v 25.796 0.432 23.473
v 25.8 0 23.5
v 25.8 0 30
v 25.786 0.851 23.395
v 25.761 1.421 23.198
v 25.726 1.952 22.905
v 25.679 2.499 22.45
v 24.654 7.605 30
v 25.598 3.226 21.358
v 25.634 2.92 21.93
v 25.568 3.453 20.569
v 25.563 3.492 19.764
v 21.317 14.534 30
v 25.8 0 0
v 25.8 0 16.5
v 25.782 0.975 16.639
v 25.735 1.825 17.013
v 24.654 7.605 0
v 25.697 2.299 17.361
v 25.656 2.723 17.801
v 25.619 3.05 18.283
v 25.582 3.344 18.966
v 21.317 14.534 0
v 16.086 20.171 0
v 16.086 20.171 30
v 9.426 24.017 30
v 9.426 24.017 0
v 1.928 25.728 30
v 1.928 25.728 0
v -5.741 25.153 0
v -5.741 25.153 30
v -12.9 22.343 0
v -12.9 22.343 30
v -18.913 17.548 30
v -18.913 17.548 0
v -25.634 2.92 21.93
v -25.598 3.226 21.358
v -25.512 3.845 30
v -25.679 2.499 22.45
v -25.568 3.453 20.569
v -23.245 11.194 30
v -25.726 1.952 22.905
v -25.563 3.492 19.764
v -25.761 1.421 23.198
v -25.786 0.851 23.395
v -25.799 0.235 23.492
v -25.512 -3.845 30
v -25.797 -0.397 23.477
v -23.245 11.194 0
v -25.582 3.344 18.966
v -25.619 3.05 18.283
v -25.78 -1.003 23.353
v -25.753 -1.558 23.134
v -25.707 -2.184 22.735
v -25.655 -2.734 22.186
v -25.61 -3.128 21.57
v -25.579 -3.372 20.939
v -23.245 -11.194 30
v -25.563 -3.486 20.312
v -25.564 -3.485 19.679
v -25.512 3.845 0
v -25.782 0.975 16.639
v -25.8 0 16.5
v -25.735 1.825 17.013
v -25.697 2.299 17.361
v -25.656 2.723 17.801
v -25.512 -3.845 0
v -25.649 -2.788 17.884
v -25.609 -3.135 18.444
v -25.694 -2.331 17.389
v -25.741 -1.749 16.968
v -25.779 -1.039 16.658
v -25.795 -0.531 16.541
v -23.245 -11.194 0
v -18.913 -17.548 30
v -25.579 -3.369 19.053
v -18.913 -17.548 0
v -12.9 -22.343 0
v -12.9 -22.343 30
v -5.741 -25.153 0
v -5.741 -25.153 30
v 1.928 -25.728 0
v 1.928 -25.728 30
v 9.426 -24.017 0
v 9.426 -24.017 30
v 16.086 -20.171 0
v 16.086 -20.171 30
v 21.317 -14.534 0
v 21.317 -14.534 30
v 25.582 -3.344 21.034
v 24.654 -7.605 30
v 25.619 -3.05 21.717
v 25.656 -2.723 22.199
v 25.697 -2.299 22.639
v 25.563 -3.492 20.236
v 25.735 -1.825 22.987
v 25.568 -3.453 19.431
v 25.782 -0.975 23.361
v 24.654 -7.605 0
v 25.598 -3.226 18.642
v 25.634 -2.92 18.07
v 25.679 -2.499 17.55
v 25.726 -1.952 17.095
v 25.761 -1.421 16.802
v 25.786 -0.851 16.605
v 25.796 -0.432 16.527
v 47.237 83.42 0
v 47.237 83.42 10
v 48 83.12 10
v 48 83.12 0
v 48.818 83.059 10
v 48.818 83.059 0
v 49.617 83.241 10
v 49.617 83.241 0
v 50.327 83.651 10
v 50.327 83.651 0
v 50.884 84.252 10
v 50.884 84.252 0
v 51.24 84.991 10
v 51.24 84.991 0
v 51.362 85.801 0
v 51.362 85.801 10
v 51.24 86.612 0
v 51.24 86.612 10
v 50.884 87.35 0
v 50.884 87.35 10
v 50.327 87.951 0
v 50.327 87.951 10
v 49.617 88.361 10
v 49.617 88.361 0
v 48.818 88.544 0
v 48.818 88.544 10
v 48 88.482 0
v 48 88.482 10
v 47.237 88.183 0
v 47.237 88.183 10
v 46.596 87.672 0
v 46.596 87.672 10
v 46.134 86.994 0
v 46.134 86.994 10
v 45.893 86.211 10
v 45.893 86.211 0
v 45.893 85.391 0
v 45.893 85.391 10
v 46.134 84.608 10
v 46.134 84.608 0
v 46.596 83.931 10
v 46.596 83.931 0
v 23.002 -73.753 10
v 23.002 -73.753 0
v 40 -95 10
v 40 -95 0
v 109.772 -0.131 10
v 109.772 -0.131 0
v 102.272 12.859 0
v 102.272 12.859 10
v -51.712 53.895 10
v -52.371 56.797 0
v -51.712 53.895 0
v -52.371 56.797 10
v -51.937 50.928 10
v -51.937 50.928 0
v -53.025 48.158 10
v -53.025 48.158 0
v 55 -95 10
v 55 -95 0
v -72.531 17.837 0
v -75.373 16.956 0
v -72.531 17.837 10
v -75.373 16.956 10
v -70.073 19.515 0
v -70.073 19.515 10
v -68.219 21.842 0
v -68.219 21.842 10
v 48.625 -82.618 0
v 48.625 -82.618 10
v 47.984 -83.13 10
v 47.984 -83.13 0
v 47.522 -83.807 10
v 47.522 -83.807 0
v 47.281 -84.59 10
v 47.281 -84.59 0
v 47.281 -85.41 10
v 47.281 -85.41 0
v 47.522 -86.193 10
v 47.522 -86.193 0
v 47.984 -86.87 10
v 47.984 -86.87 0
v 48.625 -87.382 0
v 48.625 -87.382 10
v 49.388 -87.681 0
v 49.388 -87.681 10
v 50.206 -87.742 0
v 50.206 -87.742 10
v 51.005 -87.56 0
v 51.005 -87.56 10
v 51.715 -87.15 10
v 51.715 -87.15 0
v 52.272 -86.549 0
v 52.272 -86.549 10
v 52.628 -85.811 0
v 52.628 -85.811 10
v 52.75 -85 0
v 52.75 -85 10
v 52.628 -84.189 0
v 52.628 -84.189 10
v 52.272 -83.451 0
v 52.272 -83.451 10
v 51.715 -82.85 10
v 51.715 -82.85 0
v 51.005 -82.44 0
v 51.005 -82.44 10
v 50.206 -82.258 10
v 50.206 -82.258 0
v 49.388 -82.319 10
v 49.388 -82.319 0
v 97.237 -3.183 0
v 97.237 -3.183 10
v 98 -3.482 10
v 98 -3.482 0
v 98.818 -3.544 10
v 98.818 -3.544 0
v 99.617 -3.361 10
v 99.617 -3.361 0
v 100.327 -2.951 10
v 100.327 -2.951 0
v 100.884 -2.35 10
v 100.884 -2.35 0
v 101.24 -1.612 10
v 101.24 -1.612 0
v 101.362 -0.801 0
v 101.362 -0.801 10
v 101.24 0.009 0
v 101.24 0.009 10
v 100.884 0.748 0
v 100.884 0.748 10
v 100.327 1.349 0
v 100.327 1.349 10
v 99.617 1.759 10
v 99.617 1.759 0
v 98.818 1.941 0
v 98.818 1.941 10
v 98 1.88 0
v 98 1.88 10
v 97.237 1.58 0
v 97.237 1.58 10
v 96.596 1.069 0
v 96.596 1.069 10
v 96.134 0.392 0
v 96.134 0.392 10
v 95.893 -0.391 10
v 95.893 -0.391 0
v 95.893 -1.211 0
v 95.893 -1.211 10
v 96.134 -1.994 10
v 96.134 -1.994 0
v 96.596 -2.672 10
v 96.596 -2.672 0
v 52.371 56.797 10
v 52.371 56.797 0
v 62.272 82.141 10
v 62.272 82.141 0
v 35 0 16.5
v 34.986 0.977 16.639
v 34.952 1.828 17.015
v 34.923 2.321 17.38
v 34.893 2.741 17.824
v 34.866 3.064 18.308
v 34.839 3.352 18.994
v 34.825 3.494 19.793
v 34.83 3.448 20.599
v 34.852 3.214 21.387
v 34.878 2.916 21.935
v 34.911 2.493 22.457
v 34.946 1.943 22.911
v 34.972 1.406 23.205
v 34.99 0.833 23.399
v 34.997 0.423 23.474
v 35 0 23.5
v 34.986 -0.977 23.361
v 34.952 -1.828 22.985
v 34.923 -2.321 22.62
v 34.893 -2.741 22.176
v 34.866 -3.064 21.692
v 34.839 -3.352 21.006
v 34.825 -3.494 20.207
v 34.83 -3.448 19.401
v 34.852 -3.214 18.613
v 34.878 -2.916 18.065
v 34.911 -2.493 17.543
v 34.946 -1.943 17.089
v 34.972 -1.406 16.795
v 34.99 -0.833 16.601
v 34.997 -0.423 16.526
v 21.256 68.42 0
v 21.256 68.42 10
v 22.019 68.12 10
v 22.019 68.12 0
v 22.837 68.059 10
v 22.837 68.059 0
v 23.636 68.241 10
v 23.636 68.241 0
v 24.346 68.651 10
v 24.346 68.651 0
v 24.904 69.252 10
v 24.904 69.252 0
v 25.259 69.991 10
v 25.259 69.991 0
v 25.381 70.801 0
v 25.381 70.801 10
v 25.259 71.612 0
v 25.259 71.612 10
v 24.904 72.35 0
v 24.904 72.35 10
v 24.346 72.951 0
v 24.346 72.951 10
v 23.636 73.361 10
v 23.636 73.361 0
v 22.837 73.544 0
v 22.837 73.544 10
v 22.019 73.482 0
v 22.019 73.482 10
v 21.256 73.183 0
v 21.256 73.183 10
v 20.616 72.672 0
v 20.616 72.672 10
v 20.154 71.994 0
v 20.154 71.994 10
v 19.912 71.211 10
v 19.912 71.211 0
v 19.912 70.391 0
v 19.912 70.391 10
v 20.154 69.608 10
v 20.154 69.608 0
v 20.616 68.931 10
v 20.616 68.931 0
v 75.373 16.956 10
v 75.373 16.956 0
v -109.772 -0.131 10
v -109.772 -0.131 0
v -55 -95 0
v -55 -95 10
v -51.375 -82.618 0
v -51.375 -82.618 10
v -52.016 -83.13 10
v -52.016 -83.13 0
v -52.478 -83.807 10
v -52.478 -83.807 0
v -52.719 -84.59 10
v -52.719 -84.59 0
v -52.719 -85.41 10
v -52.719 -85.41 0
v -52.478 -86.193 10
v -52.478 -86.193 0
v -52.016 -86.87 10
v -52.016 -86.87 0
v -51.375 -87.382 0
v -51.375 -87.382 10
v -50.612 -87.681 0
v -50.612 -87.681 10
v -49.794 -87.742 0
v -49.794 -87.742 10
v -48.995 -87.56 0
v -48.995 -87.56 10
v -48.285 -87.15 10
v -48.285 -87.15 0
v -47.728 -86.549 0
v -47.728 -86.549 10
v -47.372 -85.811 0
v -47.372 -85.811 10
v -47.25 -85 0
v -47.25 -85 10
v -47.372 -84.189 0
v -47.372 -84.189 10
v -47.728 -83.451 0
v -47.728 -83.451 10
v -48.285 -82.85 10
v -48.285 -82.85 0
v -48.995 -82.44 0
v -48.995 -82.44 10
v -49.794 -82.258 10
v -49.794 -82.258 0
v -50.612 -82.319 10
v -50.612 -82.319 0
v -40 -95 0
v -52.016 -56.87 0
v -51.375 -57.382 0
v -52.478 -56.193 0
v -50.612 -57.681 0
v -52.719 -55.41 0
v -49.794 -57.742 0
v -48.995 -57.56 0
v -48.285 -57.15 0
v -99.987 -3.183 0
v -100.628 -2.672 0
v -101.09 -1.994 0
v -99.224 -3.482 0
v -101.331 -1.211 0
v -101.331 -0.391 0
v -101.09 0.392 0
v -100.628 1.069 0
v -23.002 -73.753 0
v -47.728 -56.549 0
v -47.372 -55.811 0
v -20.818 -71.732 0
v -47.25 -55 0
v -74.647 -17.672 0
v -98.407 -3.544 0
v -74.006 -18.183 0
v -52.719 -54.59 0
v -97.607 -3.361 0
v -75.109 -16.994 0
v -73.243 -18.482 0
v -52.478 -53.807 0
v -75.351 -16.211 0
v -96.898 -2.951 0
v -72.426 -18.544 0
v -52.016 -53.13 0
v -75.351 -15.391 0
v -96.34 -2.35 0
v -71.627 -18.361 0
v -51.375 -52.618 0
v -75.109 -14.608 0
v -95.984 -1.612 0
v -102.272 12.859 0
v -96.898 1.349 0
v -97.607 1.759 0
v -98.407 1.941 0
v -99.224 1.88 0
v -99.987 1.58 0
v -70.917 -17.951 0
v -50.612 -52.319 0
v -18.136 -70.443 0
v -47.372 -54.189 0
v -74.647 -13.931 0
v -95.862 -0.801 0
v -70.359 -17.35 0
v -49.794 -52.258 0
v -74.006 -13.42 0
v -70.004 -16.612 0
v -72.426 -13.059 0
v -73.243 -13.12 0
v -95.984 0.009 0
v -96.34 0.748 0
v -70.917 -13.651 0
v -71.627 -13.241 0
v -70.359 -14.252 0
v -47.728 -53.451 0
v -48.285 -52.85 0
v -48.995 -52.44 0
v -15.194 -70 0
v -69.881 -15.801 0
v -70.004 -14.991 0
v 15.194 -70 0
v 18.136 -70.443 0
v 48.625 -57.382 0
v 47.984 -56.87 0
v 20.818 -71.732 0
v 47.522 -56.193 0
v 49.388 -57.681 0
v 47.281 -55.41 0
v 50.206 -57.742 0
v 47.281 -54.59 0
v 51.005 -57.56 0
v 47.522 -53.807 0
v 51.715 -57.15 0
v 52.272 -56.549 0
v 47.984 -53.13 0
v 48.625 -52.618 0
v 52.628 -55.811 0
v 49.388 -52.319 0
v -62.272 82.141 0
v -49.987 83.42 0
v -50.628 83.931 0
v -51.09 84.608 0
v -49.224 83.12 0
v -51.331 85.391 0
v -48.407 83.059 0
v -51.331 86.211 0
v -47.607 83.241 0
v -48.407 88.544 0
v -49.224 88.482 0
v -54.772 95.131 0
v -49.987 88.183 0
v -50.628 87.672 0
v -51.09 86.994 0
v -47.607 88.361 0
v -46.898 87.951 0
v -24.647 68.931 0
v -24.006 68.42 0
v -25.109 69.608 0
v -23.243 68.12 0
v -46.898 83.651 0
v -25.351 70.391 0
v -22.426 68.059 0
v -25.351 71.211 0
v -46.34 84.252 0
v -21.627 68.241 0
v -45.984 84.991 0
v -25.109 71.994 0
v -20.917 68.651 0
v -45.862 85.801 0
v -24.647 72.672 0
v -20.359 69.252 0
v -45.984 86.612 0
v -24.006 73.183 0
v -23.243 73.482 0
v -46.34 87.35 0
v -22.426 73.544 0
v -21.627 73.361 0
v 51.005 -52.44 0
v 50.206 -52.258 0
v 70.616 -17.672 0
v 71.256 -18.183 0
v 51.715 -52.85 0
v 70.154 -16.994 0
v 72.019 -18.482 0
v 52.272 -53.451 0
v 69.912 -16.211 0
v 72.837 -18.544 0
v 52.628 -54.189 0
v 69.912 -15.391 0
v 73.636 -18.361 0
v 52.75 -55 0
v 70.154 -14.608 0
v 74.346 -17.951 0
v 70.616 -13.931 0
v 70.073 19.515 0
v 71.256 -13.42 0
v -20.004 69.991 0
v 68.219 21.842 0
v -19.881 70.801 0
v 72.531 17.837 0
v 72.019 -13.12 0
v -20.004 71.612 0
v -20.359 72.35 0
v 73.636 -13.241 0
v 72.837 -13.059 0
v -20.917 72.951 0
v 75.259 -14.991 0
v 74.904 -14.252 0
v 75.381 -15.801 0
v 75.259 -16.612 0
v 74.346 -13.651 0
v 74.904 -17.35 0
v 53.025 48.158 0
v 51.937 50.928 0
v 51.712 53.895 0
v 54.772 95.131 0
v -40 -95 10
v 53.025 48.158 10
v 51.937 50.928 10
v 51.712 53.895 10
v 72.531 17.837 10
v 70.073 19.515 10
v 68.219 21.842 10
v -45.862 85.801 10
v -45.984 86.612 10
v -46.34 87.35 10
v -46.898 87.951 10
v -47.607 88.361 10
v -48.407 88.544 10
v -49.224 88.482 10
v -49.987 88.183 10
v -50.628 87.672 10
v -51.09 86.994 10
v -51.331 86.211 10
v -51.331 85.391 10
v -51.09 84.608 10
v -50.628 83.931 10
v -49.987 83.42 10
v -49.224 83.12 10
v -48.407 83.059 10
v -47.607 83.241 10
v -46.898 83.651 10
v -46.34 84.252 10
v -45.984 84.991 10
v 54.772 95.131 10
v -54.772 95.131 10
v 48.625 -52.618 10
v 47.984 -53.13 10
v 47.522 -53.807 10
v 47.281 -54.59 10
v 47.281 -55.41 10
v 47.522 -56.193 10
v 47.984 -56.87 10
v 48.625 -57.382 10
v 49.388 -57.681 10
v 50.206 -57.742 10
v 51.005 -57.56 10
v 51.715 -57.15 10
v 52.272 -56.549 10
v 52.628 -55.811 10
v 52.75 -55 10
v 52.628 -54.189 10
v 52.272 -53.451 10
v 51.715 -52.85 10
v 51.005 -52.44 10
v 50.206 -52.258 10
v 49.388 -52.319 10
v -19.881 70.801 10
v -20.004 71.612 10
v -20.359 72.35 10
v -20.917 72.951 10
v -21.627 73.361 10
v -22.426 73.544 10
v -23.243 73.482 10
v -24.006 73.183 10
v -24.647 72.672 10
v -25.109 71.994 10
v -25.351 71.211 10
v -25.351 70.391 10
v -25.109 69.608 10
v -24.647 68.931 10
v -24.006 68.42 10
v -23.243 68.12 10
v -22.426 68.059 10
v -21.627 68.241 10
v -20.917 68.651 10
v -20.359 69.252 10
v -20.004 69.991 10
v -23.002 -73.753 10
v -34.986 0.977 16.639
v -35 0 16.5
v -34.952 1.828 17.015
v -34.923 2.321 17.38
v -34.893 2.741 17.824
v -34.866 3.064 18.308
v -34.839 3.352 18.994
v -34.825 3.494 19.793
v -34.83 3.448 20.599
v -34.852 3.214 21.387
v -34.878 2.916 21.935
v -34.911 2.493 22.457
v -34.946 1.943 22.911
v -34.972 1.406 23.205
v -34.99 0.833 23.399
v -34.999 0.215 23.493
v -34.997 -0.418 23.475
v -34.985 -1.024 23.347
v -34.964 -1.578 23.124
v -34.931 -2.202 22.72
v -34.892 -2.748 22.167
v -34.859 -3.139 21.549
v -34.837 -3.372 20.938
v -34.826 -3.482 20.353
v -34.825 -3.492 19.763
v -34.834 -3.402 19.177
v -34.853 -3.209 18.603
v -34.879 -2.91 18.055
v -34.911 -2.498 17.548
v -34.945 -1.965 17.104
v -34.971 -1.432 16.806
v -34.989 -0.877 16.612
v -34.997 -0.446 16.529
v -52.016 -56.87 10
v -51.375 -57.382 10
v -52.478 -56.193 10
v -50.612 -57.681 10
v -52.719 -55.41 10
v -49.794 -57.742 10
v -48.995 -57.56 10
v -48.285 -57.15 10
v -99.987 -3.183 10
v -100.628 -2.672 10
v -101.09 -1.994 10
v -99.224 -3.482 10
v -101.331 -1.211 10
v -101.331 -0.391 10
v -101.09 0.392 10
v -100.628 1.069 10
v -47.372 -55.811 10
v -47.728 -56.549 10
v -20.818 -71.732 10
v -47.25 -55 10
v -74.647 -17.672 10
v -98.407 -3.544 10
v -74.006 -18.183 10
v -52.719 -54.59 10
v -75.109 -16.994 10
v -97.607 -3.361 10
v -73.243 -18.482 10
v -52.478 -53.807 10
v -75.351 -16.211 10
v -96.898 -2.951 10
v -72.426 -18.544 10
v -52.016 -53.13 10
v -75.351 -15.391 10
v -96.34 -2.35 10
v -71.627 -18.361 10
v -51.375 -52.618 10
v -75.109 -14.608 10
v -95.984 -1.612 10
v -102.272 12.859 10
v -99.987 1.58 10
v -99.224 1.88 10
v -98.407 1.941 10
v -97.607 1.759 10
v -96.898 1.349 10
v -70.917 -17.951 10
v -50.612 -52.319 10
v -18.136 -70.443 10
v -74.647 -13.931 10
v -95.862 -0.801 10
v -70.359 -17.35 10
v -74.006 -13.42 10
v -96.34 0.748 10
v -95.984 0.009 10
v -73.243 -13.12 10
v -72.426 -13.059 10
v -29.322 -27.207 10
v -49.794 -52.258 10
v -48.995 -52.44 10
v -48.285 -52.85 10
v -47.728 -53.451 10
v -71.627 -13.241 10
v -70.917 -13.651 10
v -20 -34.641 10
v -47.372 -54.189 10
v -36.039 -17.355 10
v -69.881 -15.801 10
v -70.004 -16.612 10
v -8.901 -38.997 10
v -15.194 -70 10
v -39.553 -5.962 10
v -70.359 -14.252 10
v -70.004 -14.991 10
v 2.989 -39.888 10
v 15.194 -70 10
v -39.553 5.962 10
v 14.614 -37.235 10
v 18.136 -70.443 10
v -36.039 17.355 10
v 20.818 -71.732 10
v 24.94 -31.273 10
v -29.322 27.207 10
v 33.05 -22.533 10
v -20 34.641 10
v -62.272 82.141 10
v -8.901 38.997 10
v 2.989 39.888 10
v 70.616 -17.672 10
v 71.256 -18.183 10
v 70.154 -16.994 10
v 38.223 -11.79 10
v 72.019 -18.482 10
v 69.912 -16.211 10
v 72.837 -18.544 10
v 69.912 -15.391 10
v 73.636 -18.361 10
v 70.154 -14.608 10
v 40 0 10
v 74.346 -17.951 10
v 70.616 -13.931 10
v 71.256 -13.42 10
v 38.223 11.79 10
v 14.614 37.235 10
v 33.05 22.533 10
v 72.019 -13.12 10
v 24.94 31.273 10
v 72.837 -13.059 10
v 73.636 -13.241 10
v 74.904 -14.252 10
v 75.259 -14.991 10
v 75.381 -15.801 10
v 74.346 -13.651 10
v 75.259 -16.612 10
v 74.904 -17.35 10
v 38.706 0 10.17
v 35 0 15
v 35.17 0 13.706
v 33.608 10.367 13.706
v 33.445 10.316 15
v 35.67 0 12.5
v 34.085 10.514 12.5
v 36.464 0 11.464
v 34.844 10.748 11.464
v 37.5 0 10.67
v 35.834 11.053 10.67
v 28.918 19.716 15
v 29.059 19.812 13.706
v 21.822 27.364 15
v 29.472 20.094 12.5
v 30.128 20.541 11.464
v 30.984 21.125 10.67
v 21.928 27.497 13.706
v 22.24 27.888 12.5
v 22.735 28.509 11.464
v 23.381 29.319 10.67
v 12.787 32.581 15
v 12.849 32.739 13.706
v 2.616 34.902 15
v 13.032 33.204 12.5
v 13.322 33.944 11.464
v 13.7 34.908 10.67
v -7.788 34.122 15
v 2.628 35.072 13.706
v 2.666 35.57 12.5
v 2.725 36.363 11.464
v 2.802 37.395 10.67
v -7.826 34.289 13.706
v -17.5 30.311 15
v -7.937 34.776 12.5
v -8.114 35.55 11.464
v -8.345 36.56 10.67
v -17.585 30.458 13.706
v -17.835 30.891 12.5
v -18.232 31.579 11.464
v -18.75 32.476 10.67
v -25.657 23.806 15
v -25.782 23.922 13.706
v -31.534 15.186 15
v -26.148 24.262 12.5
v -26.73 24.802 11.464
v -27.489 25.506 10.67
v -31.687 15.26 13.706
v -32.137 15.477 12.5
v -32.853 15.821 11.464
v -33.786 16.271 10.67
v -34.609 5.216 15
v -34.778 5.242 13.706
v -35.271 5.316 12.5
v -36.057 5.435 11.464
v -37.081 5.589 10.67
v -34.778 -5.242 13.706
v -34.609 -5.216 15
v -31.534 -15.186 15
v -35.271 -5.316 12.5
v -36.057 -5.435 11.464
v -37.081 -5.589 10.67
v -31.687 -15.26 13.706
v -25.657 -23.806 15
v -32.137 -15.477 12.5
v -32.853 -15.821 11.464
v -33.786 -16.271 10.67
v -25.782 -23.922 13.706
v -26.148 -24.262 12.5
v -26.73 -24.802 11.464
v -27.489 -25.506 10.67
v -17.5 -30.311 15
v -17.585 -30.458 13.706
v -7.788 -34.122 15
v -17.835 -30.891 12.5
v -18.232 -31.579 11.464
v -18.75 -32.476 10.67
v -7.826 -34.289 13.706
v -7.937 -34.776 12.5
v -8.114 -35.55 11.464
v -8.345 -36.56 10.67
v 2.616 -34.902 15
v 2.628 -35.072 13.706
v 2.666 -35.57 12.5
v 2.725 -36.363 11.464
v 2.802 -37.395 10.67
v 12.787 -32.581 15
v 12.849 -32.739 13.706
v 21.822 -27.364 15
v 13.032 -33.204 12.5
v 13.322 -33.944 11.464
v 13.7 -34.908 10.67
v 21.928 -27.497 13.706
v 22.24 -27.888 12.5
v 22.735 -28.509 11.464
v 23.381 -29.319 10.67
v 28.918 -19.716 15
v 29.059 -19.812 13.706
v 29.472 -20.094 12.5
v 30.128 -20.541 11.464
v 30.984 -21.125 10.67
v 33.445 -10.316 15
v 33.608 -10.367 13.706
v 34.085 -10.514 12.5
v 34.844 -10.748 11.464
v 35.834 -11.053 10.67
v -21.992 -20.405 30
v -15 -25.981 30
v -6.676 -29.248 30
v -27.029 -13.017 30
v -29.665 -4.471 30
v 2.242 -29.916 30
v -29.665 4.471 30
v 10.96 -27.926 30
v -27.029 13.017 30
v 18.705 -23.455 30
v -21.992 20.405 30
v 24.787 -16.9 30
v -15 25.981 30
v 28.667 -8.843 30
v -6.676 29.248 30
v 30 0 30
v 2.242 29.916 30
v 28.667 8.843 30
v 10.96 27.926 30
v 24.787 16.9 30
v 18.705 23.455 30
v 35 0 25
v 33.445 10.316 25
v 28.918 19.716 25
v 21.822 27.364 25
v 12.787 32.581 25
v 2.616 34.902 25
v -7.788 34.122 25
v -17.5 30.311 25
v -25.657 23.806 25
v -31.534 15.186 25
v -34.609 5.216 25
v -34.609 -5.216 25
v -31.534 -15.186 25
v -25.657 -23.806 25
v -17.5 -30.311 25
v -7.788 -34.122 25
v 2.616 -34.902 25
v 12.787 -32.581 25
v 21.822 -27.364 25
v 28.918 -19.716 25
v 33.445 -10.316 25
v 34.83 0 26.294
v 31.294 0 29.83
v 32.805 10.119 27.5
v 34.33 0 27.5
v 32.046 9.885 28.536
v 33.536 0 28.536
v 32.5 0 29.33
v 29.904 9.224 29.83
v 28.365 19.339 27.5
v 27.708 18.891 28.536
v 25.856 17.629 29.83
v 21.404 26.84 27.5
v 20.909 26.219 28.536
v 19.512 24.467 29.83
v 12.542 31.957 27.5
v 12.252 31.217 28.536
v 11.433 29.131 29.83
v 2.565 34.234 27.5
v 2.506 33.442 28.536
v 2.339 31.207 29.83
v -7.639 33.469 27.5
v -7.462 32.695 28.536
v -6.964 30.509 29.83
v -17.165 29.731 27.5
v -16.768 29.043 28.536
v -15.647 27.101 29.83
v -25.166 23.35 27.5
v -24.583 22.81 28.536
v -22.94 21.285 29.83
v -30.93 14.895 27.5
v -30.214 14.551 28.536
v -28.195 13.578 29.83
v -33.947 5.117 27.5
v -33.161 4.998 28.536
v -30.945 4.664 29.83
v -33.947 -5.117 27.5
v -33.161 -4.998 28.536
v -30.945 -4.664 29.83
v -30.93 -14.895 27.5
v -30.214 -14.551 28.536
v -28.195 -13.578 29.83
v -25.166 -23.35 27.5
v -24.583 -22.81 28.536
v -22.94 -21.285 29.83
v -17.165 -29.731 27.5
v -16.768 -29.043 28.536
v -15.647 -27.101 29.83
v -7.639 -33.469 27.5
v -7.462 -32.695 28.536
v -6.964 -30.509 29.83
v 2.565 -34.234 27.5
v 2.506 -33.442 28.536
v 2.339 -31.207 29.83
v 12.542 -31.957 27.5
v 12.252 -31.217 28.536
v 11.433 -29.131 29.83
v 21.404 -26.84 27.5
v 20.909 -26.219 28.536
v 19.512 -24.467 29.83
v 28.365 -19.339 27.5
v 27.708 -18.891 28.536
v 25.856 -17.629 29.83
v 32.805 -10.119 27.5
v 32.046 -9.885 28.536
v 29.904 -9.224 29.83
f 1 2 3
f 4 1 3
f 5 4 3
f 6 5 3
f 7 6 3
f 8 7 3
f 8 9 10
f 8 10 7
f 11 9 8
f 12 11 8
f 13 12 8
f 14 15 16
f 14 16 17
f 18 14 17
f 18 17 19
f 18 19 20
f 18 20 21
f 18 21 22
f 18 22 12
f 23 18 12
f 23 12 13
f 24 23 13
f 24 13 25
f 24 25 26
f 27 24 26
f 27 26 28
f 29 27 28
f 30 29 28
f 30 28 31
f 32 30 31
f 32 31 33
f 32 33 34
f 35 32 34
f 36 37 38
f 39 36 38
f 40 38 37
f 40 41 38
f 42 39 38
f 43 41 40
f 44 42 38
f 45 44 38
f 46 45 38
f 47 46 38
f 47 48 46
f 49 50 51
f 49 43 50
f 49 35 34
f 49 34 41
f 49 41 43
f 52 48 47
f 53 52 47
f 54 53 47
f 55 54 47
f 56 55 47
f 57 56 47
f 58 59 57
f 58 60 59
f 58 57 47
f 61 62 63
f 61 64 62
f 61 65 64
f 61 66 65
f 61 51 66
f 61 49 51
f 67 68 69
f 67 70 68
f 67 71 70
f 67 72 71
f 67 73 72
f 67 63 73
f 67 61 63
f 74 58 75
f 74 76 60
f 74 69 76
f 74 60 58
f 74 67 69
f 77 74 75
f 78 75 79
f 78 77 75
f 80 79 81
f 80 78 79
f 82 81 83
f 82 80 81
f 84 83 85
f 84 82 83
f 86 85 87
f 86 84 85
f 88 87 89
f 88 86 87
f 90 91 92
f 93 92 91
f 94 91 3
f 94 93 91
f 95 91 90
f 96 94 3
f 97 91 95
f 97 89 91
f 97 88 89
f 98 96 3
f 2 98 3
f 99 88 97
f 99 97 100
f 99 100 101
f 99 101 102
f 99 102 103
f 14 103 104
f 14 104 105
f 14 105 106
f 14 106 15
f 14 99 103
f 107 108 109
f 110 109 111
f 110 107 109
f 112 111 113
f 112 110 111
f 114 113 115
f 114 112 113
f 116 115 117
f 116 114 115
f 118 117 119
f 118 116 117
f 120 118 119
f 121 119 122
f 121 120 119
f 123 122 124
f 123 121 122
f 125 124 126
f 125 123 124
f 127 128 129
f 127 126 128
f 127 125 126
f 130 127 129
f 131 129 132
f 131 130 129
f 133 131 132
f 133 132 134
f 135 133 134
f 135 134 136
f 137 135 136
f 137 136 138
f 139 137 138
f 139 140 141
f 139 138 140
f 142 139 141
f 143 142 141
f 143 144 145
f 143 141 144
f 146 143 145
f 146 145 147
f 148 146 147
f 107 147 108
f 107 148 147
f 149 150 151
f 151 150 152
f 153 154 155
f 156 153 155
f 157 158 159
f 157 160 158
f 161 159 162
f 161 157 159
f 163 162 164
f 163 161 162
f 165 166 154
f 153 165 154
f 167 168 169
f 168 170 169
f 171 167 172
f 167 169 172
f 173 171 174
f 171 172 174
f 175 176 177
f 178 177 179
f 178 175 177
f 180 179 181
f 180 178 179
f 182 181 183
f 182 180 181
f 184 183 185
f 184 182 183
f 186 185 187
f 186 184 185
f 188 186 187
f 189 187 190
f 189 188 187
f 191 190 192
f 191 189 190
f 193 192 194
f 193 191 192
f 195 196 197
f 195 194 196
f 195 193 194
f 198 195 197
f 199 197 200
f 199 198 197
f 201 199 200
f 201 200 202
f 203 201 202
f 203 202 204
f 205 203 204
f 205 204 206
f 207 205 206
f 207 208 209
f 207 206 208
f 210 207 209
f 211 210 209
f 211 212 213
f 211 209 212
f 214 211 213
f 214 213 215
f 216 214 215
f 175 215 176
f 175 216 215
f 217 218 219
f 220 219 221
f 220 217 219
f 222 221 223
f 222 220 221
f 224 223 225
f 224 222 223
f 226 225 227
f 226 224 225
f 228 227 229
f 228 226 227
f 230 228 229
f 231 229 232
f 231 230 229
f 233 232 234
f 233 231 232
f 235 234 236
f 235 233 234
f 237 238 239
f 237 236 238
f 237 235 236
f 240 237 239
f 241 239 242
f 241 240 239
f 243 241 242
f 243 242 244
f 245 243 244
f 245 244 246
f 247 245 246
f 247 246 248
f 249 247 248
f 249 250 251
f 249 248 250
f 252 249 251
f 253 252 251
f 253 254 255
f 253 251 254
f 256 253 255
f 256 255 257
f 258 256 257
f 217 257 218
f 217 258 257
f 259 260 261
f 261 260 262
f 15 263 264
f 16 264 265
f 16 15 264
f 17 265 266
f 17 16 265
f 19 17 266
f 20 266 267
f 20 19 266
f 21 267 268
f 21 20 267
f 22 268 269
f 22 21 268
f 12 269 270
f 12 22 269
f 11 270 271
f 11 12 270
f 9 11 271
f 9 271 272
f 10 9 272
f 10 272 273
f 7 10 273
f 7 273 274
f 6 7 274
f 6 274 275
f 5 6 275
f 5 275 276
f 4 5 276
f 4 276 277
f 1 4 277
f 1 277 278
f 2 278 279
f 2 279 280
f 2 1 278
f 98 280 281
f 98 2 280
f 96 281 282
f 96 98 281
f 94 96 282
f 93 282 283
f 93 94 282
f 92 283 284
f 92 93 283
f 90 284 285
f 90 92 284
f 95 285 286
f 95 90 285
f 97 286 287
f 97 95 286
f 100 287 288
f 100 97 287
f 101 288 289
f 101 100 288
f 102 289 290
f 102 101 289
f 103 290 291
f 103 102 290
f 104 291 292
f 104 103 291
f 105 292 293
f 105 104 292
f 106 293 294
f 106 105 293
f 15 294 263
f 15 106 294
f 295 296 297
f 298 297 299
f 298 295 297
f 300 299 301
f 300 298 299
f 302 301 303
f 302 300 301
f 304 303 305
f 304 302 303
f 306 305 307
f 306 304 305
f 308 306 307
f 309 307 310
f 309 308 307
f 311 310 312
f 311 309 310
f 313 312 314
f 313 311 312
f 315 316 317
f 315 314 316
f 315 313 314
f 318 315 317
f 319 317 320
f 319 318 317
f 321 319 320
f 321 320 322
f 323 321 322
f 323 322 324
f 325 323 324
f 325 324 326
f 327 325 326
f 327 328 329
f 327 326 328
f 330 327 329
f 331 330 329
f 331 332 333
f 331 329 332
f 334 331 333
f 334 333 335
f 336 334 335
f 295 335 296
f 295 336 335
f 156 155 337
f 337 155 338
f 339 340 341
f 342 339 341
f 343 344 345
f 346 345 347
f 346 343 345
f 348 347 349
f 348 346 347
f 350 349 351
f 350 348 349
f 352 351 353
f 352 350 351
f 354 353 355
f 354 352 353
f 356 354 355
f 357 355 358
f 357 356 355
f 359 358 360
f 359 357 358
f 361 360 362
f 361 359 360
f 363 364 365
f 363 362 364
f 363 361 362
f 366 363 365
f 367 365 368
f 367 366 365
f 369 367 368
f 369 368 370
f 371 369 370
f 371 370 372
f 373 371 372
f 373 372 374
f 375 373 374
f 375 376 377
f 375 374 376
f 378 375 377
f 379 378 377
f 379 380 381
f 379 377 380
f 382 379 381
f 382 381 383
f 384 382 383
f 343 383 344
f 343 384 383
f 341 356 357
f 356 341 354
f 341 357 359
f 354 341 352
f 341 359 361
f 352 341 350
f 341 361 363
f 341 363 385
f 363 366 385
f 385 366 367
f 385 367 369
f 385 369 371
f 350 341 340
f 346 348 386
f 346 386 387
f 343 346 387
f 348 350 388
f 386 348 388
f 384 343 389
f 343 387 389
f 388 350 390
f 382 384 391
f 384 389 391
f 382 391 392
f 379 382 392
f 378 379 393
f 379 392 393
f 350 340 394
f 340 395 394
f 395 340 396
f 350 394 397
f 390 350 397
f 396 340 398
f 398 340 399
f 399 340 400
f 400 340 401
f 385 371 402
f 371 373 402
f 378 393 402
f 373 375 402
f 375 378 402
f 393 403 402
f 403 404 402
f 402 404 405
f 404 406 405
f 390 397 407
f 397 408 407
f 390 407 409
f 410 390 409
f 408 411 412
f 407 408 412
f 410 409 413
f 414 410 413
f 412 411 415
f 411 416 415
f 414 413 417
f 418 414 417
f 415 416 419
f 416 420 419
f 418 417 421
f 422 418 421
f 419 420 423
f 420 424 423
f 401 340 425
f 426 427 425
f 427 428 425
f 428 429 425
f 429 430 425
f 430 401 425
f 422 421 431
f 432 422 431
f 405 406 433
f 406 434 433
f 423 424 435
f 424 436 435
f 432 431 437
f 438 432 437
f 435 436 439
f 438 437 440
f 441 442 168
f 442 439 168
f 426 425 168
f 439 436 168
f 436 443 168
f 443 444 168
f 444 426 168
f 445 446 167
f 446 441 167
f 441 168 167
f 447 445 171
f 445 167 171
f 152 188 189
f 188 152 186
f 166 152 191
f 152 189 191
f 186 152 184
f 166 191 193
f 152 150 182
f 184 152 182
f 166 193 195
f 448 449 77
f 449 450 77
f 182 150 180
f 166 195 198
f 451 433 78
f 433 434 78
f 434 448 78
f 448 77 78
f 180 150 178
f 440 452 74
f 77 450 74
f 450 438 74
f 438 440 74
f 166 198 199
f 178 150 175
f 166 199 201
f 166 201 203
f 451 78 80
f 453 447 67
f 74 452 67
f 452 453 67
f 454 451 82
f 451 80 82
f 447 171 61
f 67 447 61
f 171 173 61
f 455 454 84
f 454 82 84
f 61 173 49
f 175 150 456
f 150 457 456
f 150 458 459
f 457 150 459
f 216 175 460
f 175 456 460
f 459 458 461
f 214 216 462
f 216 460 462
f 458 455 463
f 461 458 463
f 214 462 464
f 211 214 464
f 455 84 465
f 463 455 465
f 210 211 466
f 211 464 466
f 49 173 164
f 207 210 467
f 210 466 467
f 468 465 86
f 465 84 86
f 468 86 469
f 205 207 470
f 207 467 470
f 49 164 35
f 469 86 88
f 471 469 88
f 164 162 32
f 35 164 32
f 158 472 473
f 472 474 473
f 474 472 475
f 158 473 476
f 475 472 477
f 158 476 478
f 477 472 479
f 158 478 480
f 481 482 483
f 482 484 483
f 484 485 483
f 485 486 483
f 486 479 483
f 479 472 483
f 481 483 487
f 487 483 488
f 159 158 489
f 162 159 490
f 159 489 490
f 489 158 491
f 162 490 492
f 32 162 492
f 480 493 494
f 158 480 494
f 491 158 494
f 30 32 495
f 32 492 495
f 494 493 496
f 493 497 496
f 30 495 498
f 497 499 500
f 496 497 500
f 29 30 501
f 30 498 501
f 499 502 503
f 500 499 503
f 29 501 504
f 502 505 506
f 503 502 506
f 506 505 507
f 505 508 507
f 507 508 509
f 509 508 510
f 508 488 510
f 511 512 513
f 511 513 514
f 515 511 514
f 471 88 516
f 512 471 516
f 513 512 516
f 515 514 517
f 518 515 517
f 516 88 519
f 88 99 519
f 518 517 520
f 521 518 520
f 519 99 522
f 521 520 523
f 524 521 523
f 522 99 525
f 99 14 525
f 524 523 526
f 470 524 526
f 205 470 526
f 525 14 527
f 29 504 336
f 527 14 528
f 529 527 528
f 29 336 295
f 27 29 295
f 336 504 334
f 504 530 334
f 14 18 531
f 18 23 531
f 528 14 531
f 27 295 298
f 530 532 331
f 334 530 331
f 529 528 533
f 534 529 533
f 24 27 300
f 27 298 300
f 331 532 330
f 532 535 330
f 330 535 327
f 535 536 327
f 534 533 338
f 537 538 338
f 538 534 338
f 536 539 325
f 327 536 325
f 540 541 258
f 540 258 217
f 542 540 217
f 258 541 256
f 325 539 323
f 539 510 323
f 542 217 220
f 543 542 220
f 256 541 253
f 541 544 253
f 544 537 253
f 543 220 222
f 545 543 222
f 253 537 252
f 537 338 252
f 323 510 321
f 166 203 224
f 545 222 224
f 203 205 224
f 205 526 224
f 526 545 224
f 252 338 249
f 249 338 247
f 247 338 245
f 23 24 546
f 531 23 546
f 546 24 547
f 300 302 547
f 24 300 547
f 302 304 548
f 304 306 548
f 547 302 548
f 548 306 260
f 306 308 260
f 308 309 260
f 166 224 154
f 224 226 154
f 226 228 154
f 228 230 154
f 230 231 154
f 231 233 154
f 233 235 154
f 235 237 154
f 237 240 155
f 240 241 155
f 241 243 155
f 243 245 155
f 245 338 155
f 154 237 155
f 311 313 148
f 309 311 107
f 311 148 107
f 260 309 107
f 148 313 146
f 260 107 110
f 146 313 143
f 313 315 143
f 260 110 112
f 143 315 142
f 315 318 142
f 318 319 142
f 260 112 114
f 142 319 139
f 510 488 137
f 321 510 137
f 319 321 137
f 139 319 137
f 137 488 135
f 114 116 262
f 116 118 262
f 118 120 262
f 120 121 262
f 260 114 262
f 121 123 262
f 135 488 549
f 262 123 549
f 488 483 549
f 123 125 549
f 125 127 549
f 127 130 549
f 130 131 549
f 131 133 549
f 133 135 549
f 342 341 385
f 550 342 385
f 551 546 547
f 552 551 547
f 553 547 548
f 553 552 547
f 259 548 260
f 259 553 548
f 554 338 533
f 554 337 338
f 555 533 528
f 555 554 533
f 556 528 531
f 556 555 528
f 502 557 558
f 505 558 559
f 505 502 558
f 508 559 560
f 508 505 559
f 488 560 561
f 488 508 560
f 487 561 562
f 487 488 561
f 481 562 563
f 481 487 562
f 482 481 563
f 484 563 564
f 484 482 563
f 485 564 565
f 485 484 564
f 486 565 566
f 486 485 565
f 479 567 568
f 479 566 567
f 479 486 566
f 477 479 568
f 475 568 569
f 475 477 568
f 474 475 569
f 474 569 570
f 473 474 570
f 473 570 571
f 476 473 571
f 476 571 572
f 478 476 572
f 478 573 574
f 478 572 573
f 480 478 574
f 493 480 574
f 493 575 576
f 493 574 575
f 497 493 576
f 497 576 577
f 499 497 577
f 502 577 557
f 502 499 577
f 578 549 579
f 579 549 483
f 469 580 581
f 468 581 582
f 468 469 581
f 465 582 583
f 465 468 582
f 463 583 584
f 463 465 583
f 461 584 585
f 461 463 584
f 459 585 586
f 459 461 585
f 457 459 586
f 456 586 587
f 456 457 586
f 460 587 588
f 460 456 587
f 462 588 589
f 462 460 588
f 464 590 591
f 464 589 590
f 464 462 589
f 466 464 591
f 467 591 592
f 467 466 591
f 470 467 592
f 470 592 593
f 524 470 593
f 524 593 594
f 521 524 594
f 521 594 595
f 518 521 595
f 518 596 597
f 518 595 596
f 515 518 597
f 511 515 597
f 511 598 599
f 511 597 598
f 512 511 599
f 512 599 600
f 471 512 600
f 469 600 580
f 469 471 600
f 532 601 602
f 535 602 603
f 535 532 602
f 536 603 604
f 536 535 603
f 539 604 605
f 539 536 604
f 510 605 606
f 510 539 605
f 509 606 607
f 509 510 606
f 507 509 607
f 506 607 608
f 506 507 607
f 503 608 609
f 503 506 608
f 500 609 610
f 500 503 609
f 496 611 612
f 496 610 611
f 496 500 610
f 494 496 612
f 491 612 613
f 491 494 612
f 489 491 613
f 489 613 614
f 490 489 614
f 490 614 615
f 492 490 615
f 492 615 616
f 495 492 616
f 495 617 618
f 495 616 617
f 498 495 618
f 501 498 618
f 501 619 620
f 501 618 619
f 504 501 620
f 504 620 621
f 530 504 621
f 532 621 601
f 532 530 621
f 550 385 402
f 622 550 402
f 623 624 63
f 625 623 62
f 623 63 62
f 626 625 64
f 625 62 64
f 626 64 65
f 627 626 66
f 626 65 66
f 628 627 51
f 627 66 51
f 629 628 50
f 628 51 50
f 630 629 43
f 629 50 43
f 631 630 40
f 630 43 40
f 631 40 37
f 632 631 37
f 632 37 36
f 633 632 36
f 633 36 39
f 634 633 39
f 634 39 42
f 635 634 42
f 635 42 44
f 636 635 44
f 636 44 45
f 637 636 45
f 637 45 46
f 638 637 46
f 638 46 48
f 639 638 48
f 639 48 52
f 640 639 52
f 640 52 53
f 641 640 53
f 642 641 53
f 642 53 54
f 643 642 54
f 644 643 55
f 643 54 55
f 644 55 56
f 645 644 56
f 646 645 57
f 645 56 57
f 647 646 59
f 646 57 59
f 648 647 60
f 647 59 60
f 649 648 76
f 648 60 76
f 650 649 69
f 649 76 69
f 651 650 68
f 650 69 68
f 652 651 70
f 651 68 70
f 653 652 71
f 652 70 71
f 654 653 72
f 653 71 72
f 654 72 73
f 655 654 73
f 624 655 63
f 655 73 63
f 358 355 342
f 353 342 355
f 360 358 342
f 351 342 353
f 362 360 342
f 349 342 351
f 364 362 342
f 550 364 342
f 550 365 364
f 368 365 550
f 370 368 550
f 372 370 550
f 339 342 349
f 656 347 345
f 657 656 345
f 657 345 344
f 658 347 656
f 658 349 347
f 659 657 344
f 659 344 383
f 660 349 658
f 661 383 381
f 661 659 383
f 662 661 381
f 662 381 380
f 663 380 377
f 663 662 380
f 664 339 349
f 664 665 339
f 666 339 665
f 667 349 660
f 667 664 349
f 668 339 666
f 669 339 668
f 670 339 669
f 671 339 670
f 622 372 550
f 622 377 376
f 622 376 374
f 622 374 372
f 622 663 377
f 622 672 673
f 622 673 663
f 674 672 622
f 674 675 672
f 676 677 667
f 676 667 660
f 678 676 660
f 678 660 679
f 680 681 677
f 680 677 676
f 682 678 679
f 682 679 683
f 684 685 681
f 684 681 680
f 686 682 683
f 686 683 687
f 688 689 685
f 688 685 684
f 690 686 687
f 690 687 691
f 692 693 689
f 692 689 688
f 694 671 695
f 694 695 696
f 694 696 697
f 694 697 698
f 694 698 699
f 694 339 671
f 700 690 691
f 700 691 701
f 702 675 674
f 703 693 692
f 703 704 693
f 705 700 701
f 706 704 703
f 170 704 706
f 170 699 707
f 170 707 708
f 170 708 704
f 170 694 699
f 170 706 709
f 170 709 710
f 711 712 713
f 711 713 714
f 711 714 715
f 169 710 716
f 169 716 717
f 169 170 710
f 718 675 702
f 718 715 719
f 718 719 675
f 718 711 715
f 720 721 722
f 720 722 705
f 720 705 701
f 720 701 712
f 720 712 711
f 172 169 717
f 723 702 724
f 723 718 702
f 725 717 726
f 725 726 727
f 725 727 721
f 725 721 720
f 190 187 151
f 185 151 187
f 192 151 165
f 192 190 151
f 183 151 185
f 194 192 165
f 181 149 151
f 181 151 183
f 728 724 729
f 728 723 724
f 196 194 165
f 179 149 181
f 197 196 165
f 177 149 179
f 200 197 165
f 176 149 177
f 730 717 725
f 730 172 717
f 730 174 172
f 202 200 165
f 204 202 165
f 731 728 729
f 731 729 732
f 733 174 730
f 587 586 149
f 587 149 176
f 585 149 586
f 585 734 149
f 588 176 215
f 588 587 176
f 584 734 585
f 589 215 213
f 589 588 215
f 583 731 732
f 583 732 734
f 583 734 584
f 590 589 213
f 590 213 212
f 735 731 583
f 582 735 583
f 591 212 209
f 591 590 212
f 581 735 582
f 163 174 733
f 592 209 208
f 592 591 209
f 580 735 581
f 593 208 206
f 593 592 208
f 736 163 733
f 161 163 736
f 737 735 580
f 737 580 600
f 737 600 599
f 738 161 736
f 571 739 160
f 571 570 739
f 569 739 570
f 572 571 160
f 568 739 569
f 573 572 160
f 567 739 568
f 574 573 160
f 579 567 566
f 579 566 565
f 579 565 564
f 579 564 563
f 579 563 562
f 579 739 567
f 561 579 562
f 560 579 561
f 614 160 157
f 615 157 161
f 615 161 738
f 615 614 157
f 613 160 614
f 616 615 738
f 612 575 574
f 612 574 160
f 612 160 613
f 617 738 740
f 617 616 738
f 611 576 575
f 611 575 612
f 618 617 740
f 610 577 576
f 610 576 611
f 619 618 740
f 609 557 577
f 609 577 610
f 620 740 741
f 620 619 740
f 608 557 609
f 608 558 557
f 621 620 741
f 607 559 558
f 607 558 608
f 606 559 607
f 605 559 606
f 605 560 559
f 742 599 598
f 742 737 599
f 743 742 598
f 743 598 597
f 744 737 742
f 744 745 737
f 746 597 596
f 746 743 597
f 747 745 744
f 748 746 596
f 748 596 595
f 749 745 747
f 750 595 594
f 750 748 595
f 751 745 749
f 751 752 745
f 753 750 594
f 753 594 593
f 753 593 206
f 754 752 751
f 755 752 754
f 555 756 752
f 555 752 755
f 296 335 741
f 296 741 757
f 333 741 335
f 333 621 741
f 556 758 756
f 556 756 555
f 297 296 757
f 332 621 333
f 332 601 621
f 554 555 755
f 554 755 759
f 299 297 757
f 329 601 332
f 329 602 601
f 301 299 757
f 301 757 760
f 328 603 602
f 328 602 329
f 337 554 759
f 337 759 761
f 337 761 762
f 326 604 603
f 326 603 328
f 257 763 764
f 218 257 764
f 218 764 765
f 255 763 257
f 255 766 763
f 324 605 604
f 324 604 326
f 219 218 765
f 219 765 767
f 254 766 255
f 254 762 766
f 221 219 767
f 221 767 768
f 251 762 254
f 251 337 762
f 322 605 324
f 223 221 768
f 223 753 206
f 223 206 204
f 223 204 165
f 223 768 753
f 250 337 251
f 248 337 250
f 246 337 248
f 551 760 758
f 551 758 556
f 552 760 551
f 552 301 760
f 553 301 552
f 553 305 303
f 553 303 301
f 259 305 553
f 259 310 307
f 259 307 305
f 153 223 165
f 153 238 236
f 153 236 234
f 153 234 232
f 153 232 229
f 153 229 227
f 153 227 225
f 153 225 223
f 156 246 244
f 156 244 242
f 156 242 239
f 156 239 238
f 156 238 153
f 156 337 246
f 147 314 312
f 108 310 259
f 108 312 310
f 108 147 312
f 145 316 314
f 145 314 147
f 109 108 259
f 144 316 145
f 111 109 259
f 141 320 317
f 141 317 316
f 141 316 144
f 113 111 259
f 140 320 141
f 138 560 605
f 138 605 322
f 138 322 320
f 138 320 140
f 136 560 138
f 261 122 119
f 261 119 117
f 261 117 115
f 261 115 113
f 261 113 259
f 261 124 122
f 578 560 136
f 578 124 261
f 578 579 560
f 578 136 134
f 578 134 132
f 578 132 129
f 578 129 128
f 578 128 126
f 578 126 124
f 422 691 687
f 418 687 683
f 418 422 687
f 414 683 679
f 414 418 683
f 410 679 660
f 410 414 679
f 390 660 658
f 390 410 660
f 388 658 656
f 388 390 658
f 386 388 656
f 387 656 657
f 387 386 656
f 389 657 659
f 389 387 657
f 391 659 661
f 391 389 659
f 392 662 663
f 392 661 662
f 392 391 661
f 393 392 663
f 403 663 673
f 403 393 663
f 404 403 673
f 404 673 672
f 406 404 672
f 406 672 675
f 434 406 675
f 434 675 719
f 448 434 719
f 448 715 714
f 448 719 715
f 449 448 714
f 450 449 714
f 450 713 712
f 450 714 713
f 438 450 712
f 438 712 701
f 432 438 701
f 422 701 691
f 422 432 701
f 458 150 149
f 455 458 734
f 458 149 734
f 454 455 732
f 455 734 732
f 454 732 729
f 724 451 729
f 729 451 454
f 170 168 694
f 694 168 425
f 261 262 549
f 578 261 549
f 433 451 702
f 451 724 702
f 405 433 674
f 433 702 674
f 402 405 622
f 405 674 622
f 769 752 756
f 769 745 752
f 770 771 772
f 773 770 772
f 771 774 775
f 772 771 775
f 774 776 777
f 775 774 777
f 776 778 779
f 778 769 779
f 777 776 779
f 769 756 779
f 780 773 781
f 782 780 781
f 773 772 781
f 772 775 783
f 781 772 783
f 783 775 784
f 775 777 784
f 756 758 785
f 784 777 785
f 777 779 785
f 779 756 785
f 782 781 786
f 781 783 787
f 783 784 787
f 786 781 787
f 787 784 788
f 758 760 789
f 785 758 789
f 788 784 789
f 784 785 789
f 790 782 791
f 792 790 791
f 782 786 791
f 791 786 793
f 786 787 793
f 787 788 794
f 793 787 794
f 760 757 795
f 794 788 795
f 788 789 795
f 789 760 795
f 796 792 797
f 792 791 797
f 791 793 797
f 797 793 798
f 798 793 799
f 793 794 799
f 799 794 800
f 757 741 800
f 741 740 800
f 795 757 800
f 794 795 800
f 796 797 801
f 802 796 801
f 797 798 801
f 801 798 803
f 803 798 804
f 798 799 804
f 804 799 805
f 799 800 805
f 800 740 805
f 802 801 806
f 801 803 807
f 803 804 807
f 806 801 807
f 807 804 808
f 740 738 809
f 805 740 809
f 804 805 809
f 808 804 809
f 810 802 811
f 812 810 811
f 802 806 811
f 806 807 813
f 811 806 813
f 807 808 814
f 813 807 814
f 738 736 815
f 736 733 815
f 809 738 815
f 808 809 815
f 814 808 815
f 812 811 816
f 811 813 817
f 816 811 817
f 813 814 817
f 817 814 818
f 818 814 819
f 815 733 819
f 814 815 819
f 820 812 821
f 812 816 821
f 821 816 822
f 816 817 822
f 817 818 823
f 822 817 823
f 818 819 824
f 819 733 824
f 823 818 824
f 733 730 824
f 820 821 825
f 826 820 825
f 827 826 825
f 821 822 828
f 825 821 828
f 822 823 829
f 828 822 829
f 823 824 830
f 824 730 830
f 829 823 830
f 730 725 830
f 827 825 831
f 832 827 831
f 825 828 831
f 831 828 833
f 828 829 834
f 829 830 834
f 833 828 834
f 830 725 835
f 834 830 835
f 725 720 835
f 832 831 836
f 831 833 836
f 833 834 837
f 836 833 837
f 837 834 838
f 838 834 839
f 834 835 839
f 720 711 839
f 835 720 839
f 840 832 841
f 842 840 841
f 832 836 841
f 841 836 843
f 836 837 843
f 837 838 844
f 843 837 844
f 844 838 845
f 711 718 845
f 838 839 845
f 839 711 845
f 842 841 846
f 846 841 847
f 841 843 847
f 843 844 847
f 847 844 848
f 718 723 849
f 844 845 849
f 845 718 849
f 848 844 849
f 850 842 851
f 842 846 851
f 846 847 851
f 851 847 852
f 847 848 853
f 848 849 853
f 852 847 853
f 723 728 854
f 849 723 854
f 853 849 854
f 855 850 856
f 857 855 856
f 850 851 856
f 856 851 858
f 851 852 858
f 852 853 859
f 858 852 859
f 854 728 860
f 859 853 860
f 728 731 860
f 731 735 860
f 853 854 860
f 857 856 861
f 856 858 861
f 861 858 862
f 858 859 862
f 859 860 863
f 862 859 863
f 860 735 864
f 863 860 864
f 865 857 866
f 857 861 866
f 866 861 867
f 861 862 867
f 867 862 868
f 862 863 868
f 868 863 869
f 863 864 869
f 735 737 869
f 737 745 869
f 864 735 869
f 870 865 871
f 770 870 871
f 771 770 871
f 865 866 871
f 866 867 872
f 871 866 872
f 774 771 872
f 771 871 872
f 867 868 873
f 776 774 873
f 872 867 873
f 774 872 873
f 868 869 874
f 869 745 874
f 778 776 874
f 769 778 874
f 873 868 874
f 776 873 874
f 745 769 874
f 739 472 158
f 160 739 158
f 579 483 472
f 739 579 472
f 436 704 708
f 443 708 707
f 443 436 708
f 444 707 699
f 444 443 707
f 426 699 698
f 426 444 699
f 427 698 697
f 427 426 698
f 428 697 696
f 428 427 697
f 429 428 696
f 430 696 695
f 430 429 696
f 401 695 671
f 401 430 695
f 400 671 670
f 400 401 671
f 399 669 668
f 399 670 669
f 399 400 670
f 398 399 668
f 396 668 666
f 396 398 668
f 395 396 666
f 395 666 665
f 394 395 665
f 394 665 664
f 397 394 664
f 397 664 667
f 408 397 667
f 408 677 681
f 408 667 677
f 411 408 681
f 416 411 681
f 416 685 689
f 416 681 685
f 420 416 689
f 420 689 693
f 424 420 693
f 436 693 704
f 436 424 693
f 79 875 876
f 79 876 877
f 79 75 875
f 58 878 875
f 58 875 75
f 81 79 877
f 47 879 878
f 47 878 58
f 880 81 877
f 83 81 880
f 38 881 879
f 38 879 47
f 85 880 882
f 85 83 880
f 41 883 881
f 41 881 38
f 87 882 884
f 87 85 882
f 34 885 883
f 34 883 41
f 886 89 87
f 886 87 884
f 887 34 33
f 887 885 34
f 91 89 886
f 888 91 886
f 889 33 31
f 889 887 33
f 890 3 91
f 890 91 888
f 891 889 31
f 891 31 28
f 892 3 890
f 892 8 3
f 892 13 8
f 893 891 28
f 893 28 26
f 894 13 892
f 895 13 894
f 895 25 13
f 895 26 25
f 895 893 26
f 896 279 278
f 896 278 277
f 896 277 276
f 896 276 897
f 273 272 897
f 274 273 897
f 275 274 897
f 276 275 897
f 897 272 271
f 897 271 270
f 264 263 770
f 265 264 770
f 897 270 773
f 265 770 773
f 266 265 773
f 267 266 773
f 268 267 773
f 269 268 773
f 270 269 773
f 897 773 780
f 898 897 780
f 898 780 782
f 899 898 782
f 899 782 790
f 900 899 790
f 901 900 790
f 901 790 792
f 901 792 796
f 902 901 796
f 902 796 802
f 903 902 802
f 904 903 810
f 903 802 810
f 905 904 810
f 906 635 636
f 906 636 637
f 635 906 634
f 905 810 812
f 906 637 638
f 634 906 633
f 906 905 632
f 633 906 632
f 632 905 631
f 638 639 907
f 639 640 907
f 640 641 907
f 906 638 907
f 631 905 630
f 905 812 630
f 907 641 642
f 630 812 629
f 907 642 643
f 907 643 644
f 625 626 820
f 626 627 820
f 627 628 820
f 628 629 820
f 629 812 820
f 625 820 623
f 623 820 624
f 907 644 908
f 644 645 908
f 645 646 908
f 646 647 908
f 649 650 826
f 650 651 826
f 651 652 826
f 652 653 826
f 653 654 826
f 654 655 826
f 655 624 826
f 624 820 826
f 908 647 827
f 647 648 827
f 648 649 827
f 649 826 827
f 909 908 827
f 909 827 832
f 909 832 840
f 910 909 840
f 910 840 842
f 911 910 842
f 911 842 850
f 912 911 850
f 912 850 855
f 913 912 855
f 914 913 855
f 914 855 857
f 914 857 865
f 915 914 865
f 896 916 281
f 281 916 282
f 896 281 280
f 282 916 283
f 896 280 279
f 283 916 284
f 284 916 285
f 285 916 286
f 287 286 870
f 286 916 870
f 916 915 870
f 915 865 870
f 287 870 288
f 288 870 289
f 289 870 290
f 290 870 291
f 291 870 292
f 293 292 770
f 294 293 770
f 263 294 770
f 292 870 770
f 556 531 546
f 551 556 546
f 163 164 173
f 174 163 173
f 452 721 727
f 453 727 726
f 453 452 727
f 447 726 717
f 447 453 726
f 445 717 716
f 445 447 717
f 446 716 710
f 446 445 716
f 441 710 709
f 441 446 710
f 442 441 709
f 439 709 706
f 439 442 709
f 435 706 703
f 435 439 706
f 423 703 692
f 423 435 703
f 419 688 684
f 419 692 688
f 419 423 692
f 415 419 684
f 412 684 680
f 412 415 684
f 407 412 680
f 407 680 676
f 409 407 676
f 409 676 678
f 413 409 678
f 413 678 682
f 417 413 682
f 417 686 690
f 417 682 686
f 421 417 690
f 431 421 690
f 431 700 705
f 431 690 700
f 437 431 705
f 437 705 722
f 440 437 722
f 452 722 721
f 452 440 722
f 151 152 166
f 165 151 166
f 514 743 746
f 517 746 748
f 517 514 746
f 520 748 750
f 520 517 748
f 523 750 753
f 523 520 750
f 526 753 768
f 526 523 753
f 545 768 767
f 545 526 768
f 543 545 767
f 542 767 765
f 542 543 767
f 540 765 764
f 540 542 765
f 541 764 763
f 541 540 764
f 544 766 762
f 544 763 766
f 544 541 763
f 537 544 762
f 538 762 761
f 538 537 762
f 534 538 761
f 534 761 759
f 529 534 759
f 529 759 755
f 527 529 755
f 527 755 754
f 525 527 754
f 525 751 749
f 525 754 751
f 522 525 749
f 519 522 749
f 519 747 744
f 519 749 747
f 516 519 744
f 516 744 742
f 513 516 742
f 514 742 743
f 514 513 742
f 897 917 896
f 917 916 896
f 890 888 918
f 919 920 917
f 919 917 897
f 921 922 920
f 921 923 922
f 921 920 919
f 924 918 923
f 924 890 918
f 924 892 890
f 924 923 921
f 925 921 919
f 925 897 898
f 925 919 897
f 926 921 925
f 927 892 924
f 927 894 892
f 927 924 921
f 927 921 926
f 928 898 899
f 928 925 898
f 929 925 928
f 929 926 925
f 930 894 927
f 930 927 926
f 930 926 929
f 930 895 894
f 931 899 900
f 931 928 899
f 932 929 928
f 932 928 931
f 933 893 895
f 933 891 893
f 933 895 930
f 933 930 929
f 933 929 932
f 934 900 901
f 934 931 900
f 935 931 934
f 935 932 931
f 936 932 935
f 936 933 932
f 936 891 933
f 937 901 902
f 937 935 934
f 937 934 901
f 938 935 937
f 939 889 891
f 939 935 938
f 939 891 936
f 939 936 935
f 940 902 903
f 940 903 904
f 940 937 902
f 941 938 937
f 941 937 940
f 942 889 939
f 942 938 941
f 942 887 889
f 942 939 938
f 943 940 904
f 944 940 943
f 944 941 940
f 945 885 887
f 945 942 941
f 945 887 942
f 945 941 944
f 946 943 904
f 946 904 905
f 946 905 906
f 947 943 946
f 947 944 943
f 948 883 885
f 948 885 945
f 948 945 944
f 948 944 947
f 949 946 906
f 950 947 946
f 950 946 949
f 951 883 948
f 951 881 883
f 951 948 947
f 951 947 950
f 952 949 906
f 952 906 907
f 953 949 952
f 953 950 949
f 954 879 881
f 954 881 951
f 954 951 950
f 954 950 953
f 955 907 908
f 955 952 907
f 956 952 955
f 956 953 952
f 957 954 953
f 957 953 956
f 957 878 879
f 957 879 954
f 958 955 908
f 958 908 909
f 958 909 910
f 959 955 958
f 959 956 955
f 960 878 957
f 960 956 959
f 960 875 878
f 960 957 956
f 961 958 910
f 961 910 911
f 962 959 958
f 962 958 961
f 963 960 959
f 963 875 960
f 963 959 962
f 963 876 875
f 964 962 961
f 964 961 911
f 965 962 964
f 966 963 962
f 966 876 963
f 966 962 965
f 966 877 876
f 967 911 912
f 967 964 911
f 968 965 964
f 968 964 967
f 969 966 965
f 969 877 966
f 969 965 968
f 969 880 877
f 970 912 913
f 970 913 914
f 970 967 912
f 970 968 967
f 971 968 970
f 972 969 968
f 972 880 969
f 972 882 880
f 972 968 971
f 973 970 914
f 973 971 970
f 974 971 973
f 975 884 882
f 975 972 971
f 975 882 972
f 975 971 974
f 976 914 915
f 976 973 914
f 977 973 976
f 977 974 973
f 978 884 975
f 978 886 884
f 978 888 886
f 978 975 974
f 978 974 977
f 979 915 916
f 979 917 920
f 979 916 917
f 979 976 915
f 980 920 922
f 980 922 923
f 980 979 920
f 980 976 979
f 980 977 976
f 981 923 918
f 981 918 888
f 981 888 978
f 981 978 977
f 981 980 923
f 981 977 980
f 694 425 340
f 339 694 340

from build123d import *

# Parameters (mm, degrees)
SKETCH011_R        = 25.8
PAD007_DEPTH       = 10
SKETCH012_R        = 2.75
POCKET003_DEPTH    = 591.2062275863
POLARPATTERN_COUNT = 3
SKETCH_R           = 35
SKETCH_R_2         = 25.8
PAD_DEPTH          = 20
FILLET_R           = 5
SKETCH013_R        = 3.5
POCKET_DEPTH       = 109.7734133595
POCKET_DEPTH_BACK  = 109.7734133595
FILLET001_R        = 10


with BuildPart() as part:
    # Sketch011 → Pad007 (new body)
    with BuildSketch(Plane.XY):
        Polygon((-54.7724133595, 95.1313972081), (-109.7724133595, -0.1313972081), (-55, -95), (55, -95), (109.7724133595, -0.1313972081), (54.7724133595, 95.1313972081), align=None)
        Circle(SKETCH011_R, mode=Mode.SUBTRACT)
    extrude(amount=PAD007_DEPTH)

    # Sketch012 → Pocket003 (cut, through all)
    with BuildSketch(Plane.XY):
        with Locations((-48.6121593217, 85.8012701892)):
            Circle(SKETCH012_R)
        with Locations((-98.6121593217, -0.8012701892)):
            Circle(SKETCH012_R)
        with Locations((-22.6313972081, 70.8012701892)):
            Circle(SKETCH012_R)
        with Locations((-72.6313972081, -15.8012701892)):
            Circle(SKETCH012_R)
        Polygon((-62.2724133595, 82.1410161514), (-50.6217782649, 52.3205080757), (-70.6217782649, 17.6794919243), (-102.2724133595, 12.8589838486), align=None)
    pocket003 = extrude(amount=POCKET003_DEPTH, mode=Mode.SUBTRACT)

    # PolarPattern: Pocket003 ×3 about axis
    polarpattern_axis = Axis((0, 0, 0), (0, 0, 1))
    for i in range(1, POLARPATTERN_COUNT):
        add(pocket003.rotate(polarpattern_axis, i * 360 / POLARPATTERN_COUNT), mode=Mode.SUBTRACT)

    # Sketch (on Face5 of PolarPattern) → Pad (join)
    with BuildSketch(Plane.XY.offset(10)):
        Circle(SKETCH_R)
        Circle(SKETCH_R_2, mode=Mode.SUBTRACT)
    extrude(amount=PAD_DEPTH)

    # Fillet
    fillet_edges = [part.edges().sort_by_distance(p)[0] for p in [
        (-35, 0, 10),
        (-35, 0, 30),
    ]]
    fillet(fillet_edges, radius=FILLET_R)

    # Sketch013 (on DatumPlane) → Pocket (cut, two sides)
    with BuildSketch(Plane(origin=(0, 0, 15), x_dir=(0, 0, -1), z_dir=(1, 0, 0))) as pocket_sk:
        with Locations((-5, 0)):
            Circle(SKETCH013_R)
    extrude(amount=-POCKET_DEPTH, mode=Mode.SUBTRACT)
    extrude(pocket_sk.sketch, amount=POCKET_DEPTH_BACK, mode=Mode.SUBTRACT)

    # Fillet001
    fillet001_edges = [part.edges().sort_by_distance(p)[0] for p in [
        (20, -70, 5),
        (-20, -70, 5),
        (50.621778, 52.320508, 5),
        (70.621778, 17.679492, 5),
        (-50.621778, 52.320508, 5),
        (-70.621778, 17.679492, 5),
    ]]
    fillet(fillet001_edges, radius=FILLET001_R)


solid = part.part
